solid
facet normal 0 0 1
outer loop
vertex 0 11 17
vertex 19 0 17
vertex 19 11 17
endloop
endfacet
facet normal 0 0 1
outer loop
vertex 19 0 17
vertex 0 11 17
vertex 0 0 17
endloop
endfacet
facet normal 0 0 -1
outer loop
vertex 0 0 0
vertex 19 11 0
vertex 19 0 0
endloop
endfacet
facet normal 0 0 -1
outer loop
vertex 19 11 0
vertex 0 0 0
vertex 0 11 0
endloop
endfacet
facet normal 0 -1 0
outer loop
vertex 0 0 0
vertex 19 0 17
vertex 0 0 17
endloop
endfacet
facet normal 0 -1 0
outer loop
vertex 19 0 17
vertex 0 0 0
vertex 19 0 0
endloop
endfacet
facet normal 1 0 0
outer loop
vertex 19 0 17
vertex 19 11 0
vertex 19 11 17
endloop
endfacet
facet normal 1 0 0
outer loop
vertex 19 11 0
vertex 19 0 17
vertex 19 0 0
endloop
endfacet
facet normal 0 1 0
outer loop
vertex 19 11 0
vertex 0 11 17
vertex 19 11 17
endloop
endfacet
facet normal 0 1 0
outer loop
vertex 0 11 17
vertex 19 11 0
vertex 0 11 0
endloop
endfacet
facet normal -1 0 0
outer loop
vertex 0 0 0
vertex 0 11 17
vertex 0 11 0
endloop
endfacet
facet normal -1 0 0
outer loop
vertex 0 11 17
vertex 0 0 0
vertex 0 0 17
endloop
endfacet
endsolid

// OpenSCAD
// Generated by SolidPython 1.0.1 on 2020-07-29 00:46:56


cube(size = [19, 11, 17]);
/***********************************************
*********      SolidPython code:      **********
************************************************
 
# import packages: SolidPython
from solid import *
from solid.utils import *
from itertools import chain, combinations, permutations


class Resize:

    def __init__(self, scad_file):
        self.scad_file = scad_file
        #self.scad_file = import_scad(scad_file)
        # cone/cylinder param:
        self.r1 = 0
        self.r2 = 0
        self.h = 0
        # rectangular prism param:
        self.w = 0
        self.l = 0
        # ellipse param:
        self.r = 0

    # import OpenScad code (file name corresponds to shape)


    # classify shape + parameters
    def assign(self, param1, param2, param3):
        if self.scad_file == 'cone.scad':
            self.r1 = param1
            self.r2 = param2
            self.h = param3
        elif self.scad_file == 'cylinder.scad':
            self.r1 = param1
            self.r2 = param2
            self.h = param3
        elif self.scad_file == 'rectangularPrism.scad':
            self.h = param1
            self.l = param2
            self.w = param3
        else:
            self.r = param1
            self.h = param2

    # resize parameters
    def iterate(self):
        x = range(3, 20, 2)
        i = 1
        if self.scad_file == 'cone.scad':
            tempList = list(permutations(x, 2))
            for temp in tempList:
                param1 = temp[0]
                param2 = temp[1]
                filepath = 'produced_scad_files/' + 'cone' + str(param1) + '_' + str(param2) + '_' + '.scad'
                scad_render_to_file(cylinder(h=param1, r1=param2, r2=0), filepath)

        elif self.scad_file == 'cylinder.scad':
            tempList = list(permutations(x, 3))
            for temp in tempList:
                param1 = temp[0]
                param2 = temp[1]
                filepath = 'produced_scad_files/' + 'cylinder' + str(param1) + '_' + str(param2) + '_' + '.scad'
                scad_render_to_file(cylinder(h=param1, r1=param2, r2=param2), filepath)

        elif self.scad_file == 'rectangularPrism.scad':
            tempList = list(permutations(x, 3))
            for temp in tempList:
                param1 = temp[0]
                param2 = temp[1]
                param3 = temp[2]
                filepath = 'produced_scad_files/' + 'rectangularPrism' + str(param1) + '_' + str(param2) + '_' + str(
                    param3) + '.scad'
                scad_render_to_file(cube(size=(param1, param2, param3)), filepath)

        elif self.scad_file == 'ellipse.scad':
            tempList = list(permutations(x, 4))
            for temp in tempList:
                param1 = temp[0]
                param2 = temp[1]
                param3 = temp[2]
                param4 = temp[3]
                filepath = 'produced_scad_files/' + 'ellipse' + str(param1) + '_' + str(param2) + '_' + str(param3) + '_' + str(param4) + '.scad'
                scad_render_to_file(scale([param1, param2, param3])(sphere(r=param4)), filepath)

    def render_to_scadfile(self):
        scad_render_to_file(scad, 'example.scad') 
 
************************************************/
